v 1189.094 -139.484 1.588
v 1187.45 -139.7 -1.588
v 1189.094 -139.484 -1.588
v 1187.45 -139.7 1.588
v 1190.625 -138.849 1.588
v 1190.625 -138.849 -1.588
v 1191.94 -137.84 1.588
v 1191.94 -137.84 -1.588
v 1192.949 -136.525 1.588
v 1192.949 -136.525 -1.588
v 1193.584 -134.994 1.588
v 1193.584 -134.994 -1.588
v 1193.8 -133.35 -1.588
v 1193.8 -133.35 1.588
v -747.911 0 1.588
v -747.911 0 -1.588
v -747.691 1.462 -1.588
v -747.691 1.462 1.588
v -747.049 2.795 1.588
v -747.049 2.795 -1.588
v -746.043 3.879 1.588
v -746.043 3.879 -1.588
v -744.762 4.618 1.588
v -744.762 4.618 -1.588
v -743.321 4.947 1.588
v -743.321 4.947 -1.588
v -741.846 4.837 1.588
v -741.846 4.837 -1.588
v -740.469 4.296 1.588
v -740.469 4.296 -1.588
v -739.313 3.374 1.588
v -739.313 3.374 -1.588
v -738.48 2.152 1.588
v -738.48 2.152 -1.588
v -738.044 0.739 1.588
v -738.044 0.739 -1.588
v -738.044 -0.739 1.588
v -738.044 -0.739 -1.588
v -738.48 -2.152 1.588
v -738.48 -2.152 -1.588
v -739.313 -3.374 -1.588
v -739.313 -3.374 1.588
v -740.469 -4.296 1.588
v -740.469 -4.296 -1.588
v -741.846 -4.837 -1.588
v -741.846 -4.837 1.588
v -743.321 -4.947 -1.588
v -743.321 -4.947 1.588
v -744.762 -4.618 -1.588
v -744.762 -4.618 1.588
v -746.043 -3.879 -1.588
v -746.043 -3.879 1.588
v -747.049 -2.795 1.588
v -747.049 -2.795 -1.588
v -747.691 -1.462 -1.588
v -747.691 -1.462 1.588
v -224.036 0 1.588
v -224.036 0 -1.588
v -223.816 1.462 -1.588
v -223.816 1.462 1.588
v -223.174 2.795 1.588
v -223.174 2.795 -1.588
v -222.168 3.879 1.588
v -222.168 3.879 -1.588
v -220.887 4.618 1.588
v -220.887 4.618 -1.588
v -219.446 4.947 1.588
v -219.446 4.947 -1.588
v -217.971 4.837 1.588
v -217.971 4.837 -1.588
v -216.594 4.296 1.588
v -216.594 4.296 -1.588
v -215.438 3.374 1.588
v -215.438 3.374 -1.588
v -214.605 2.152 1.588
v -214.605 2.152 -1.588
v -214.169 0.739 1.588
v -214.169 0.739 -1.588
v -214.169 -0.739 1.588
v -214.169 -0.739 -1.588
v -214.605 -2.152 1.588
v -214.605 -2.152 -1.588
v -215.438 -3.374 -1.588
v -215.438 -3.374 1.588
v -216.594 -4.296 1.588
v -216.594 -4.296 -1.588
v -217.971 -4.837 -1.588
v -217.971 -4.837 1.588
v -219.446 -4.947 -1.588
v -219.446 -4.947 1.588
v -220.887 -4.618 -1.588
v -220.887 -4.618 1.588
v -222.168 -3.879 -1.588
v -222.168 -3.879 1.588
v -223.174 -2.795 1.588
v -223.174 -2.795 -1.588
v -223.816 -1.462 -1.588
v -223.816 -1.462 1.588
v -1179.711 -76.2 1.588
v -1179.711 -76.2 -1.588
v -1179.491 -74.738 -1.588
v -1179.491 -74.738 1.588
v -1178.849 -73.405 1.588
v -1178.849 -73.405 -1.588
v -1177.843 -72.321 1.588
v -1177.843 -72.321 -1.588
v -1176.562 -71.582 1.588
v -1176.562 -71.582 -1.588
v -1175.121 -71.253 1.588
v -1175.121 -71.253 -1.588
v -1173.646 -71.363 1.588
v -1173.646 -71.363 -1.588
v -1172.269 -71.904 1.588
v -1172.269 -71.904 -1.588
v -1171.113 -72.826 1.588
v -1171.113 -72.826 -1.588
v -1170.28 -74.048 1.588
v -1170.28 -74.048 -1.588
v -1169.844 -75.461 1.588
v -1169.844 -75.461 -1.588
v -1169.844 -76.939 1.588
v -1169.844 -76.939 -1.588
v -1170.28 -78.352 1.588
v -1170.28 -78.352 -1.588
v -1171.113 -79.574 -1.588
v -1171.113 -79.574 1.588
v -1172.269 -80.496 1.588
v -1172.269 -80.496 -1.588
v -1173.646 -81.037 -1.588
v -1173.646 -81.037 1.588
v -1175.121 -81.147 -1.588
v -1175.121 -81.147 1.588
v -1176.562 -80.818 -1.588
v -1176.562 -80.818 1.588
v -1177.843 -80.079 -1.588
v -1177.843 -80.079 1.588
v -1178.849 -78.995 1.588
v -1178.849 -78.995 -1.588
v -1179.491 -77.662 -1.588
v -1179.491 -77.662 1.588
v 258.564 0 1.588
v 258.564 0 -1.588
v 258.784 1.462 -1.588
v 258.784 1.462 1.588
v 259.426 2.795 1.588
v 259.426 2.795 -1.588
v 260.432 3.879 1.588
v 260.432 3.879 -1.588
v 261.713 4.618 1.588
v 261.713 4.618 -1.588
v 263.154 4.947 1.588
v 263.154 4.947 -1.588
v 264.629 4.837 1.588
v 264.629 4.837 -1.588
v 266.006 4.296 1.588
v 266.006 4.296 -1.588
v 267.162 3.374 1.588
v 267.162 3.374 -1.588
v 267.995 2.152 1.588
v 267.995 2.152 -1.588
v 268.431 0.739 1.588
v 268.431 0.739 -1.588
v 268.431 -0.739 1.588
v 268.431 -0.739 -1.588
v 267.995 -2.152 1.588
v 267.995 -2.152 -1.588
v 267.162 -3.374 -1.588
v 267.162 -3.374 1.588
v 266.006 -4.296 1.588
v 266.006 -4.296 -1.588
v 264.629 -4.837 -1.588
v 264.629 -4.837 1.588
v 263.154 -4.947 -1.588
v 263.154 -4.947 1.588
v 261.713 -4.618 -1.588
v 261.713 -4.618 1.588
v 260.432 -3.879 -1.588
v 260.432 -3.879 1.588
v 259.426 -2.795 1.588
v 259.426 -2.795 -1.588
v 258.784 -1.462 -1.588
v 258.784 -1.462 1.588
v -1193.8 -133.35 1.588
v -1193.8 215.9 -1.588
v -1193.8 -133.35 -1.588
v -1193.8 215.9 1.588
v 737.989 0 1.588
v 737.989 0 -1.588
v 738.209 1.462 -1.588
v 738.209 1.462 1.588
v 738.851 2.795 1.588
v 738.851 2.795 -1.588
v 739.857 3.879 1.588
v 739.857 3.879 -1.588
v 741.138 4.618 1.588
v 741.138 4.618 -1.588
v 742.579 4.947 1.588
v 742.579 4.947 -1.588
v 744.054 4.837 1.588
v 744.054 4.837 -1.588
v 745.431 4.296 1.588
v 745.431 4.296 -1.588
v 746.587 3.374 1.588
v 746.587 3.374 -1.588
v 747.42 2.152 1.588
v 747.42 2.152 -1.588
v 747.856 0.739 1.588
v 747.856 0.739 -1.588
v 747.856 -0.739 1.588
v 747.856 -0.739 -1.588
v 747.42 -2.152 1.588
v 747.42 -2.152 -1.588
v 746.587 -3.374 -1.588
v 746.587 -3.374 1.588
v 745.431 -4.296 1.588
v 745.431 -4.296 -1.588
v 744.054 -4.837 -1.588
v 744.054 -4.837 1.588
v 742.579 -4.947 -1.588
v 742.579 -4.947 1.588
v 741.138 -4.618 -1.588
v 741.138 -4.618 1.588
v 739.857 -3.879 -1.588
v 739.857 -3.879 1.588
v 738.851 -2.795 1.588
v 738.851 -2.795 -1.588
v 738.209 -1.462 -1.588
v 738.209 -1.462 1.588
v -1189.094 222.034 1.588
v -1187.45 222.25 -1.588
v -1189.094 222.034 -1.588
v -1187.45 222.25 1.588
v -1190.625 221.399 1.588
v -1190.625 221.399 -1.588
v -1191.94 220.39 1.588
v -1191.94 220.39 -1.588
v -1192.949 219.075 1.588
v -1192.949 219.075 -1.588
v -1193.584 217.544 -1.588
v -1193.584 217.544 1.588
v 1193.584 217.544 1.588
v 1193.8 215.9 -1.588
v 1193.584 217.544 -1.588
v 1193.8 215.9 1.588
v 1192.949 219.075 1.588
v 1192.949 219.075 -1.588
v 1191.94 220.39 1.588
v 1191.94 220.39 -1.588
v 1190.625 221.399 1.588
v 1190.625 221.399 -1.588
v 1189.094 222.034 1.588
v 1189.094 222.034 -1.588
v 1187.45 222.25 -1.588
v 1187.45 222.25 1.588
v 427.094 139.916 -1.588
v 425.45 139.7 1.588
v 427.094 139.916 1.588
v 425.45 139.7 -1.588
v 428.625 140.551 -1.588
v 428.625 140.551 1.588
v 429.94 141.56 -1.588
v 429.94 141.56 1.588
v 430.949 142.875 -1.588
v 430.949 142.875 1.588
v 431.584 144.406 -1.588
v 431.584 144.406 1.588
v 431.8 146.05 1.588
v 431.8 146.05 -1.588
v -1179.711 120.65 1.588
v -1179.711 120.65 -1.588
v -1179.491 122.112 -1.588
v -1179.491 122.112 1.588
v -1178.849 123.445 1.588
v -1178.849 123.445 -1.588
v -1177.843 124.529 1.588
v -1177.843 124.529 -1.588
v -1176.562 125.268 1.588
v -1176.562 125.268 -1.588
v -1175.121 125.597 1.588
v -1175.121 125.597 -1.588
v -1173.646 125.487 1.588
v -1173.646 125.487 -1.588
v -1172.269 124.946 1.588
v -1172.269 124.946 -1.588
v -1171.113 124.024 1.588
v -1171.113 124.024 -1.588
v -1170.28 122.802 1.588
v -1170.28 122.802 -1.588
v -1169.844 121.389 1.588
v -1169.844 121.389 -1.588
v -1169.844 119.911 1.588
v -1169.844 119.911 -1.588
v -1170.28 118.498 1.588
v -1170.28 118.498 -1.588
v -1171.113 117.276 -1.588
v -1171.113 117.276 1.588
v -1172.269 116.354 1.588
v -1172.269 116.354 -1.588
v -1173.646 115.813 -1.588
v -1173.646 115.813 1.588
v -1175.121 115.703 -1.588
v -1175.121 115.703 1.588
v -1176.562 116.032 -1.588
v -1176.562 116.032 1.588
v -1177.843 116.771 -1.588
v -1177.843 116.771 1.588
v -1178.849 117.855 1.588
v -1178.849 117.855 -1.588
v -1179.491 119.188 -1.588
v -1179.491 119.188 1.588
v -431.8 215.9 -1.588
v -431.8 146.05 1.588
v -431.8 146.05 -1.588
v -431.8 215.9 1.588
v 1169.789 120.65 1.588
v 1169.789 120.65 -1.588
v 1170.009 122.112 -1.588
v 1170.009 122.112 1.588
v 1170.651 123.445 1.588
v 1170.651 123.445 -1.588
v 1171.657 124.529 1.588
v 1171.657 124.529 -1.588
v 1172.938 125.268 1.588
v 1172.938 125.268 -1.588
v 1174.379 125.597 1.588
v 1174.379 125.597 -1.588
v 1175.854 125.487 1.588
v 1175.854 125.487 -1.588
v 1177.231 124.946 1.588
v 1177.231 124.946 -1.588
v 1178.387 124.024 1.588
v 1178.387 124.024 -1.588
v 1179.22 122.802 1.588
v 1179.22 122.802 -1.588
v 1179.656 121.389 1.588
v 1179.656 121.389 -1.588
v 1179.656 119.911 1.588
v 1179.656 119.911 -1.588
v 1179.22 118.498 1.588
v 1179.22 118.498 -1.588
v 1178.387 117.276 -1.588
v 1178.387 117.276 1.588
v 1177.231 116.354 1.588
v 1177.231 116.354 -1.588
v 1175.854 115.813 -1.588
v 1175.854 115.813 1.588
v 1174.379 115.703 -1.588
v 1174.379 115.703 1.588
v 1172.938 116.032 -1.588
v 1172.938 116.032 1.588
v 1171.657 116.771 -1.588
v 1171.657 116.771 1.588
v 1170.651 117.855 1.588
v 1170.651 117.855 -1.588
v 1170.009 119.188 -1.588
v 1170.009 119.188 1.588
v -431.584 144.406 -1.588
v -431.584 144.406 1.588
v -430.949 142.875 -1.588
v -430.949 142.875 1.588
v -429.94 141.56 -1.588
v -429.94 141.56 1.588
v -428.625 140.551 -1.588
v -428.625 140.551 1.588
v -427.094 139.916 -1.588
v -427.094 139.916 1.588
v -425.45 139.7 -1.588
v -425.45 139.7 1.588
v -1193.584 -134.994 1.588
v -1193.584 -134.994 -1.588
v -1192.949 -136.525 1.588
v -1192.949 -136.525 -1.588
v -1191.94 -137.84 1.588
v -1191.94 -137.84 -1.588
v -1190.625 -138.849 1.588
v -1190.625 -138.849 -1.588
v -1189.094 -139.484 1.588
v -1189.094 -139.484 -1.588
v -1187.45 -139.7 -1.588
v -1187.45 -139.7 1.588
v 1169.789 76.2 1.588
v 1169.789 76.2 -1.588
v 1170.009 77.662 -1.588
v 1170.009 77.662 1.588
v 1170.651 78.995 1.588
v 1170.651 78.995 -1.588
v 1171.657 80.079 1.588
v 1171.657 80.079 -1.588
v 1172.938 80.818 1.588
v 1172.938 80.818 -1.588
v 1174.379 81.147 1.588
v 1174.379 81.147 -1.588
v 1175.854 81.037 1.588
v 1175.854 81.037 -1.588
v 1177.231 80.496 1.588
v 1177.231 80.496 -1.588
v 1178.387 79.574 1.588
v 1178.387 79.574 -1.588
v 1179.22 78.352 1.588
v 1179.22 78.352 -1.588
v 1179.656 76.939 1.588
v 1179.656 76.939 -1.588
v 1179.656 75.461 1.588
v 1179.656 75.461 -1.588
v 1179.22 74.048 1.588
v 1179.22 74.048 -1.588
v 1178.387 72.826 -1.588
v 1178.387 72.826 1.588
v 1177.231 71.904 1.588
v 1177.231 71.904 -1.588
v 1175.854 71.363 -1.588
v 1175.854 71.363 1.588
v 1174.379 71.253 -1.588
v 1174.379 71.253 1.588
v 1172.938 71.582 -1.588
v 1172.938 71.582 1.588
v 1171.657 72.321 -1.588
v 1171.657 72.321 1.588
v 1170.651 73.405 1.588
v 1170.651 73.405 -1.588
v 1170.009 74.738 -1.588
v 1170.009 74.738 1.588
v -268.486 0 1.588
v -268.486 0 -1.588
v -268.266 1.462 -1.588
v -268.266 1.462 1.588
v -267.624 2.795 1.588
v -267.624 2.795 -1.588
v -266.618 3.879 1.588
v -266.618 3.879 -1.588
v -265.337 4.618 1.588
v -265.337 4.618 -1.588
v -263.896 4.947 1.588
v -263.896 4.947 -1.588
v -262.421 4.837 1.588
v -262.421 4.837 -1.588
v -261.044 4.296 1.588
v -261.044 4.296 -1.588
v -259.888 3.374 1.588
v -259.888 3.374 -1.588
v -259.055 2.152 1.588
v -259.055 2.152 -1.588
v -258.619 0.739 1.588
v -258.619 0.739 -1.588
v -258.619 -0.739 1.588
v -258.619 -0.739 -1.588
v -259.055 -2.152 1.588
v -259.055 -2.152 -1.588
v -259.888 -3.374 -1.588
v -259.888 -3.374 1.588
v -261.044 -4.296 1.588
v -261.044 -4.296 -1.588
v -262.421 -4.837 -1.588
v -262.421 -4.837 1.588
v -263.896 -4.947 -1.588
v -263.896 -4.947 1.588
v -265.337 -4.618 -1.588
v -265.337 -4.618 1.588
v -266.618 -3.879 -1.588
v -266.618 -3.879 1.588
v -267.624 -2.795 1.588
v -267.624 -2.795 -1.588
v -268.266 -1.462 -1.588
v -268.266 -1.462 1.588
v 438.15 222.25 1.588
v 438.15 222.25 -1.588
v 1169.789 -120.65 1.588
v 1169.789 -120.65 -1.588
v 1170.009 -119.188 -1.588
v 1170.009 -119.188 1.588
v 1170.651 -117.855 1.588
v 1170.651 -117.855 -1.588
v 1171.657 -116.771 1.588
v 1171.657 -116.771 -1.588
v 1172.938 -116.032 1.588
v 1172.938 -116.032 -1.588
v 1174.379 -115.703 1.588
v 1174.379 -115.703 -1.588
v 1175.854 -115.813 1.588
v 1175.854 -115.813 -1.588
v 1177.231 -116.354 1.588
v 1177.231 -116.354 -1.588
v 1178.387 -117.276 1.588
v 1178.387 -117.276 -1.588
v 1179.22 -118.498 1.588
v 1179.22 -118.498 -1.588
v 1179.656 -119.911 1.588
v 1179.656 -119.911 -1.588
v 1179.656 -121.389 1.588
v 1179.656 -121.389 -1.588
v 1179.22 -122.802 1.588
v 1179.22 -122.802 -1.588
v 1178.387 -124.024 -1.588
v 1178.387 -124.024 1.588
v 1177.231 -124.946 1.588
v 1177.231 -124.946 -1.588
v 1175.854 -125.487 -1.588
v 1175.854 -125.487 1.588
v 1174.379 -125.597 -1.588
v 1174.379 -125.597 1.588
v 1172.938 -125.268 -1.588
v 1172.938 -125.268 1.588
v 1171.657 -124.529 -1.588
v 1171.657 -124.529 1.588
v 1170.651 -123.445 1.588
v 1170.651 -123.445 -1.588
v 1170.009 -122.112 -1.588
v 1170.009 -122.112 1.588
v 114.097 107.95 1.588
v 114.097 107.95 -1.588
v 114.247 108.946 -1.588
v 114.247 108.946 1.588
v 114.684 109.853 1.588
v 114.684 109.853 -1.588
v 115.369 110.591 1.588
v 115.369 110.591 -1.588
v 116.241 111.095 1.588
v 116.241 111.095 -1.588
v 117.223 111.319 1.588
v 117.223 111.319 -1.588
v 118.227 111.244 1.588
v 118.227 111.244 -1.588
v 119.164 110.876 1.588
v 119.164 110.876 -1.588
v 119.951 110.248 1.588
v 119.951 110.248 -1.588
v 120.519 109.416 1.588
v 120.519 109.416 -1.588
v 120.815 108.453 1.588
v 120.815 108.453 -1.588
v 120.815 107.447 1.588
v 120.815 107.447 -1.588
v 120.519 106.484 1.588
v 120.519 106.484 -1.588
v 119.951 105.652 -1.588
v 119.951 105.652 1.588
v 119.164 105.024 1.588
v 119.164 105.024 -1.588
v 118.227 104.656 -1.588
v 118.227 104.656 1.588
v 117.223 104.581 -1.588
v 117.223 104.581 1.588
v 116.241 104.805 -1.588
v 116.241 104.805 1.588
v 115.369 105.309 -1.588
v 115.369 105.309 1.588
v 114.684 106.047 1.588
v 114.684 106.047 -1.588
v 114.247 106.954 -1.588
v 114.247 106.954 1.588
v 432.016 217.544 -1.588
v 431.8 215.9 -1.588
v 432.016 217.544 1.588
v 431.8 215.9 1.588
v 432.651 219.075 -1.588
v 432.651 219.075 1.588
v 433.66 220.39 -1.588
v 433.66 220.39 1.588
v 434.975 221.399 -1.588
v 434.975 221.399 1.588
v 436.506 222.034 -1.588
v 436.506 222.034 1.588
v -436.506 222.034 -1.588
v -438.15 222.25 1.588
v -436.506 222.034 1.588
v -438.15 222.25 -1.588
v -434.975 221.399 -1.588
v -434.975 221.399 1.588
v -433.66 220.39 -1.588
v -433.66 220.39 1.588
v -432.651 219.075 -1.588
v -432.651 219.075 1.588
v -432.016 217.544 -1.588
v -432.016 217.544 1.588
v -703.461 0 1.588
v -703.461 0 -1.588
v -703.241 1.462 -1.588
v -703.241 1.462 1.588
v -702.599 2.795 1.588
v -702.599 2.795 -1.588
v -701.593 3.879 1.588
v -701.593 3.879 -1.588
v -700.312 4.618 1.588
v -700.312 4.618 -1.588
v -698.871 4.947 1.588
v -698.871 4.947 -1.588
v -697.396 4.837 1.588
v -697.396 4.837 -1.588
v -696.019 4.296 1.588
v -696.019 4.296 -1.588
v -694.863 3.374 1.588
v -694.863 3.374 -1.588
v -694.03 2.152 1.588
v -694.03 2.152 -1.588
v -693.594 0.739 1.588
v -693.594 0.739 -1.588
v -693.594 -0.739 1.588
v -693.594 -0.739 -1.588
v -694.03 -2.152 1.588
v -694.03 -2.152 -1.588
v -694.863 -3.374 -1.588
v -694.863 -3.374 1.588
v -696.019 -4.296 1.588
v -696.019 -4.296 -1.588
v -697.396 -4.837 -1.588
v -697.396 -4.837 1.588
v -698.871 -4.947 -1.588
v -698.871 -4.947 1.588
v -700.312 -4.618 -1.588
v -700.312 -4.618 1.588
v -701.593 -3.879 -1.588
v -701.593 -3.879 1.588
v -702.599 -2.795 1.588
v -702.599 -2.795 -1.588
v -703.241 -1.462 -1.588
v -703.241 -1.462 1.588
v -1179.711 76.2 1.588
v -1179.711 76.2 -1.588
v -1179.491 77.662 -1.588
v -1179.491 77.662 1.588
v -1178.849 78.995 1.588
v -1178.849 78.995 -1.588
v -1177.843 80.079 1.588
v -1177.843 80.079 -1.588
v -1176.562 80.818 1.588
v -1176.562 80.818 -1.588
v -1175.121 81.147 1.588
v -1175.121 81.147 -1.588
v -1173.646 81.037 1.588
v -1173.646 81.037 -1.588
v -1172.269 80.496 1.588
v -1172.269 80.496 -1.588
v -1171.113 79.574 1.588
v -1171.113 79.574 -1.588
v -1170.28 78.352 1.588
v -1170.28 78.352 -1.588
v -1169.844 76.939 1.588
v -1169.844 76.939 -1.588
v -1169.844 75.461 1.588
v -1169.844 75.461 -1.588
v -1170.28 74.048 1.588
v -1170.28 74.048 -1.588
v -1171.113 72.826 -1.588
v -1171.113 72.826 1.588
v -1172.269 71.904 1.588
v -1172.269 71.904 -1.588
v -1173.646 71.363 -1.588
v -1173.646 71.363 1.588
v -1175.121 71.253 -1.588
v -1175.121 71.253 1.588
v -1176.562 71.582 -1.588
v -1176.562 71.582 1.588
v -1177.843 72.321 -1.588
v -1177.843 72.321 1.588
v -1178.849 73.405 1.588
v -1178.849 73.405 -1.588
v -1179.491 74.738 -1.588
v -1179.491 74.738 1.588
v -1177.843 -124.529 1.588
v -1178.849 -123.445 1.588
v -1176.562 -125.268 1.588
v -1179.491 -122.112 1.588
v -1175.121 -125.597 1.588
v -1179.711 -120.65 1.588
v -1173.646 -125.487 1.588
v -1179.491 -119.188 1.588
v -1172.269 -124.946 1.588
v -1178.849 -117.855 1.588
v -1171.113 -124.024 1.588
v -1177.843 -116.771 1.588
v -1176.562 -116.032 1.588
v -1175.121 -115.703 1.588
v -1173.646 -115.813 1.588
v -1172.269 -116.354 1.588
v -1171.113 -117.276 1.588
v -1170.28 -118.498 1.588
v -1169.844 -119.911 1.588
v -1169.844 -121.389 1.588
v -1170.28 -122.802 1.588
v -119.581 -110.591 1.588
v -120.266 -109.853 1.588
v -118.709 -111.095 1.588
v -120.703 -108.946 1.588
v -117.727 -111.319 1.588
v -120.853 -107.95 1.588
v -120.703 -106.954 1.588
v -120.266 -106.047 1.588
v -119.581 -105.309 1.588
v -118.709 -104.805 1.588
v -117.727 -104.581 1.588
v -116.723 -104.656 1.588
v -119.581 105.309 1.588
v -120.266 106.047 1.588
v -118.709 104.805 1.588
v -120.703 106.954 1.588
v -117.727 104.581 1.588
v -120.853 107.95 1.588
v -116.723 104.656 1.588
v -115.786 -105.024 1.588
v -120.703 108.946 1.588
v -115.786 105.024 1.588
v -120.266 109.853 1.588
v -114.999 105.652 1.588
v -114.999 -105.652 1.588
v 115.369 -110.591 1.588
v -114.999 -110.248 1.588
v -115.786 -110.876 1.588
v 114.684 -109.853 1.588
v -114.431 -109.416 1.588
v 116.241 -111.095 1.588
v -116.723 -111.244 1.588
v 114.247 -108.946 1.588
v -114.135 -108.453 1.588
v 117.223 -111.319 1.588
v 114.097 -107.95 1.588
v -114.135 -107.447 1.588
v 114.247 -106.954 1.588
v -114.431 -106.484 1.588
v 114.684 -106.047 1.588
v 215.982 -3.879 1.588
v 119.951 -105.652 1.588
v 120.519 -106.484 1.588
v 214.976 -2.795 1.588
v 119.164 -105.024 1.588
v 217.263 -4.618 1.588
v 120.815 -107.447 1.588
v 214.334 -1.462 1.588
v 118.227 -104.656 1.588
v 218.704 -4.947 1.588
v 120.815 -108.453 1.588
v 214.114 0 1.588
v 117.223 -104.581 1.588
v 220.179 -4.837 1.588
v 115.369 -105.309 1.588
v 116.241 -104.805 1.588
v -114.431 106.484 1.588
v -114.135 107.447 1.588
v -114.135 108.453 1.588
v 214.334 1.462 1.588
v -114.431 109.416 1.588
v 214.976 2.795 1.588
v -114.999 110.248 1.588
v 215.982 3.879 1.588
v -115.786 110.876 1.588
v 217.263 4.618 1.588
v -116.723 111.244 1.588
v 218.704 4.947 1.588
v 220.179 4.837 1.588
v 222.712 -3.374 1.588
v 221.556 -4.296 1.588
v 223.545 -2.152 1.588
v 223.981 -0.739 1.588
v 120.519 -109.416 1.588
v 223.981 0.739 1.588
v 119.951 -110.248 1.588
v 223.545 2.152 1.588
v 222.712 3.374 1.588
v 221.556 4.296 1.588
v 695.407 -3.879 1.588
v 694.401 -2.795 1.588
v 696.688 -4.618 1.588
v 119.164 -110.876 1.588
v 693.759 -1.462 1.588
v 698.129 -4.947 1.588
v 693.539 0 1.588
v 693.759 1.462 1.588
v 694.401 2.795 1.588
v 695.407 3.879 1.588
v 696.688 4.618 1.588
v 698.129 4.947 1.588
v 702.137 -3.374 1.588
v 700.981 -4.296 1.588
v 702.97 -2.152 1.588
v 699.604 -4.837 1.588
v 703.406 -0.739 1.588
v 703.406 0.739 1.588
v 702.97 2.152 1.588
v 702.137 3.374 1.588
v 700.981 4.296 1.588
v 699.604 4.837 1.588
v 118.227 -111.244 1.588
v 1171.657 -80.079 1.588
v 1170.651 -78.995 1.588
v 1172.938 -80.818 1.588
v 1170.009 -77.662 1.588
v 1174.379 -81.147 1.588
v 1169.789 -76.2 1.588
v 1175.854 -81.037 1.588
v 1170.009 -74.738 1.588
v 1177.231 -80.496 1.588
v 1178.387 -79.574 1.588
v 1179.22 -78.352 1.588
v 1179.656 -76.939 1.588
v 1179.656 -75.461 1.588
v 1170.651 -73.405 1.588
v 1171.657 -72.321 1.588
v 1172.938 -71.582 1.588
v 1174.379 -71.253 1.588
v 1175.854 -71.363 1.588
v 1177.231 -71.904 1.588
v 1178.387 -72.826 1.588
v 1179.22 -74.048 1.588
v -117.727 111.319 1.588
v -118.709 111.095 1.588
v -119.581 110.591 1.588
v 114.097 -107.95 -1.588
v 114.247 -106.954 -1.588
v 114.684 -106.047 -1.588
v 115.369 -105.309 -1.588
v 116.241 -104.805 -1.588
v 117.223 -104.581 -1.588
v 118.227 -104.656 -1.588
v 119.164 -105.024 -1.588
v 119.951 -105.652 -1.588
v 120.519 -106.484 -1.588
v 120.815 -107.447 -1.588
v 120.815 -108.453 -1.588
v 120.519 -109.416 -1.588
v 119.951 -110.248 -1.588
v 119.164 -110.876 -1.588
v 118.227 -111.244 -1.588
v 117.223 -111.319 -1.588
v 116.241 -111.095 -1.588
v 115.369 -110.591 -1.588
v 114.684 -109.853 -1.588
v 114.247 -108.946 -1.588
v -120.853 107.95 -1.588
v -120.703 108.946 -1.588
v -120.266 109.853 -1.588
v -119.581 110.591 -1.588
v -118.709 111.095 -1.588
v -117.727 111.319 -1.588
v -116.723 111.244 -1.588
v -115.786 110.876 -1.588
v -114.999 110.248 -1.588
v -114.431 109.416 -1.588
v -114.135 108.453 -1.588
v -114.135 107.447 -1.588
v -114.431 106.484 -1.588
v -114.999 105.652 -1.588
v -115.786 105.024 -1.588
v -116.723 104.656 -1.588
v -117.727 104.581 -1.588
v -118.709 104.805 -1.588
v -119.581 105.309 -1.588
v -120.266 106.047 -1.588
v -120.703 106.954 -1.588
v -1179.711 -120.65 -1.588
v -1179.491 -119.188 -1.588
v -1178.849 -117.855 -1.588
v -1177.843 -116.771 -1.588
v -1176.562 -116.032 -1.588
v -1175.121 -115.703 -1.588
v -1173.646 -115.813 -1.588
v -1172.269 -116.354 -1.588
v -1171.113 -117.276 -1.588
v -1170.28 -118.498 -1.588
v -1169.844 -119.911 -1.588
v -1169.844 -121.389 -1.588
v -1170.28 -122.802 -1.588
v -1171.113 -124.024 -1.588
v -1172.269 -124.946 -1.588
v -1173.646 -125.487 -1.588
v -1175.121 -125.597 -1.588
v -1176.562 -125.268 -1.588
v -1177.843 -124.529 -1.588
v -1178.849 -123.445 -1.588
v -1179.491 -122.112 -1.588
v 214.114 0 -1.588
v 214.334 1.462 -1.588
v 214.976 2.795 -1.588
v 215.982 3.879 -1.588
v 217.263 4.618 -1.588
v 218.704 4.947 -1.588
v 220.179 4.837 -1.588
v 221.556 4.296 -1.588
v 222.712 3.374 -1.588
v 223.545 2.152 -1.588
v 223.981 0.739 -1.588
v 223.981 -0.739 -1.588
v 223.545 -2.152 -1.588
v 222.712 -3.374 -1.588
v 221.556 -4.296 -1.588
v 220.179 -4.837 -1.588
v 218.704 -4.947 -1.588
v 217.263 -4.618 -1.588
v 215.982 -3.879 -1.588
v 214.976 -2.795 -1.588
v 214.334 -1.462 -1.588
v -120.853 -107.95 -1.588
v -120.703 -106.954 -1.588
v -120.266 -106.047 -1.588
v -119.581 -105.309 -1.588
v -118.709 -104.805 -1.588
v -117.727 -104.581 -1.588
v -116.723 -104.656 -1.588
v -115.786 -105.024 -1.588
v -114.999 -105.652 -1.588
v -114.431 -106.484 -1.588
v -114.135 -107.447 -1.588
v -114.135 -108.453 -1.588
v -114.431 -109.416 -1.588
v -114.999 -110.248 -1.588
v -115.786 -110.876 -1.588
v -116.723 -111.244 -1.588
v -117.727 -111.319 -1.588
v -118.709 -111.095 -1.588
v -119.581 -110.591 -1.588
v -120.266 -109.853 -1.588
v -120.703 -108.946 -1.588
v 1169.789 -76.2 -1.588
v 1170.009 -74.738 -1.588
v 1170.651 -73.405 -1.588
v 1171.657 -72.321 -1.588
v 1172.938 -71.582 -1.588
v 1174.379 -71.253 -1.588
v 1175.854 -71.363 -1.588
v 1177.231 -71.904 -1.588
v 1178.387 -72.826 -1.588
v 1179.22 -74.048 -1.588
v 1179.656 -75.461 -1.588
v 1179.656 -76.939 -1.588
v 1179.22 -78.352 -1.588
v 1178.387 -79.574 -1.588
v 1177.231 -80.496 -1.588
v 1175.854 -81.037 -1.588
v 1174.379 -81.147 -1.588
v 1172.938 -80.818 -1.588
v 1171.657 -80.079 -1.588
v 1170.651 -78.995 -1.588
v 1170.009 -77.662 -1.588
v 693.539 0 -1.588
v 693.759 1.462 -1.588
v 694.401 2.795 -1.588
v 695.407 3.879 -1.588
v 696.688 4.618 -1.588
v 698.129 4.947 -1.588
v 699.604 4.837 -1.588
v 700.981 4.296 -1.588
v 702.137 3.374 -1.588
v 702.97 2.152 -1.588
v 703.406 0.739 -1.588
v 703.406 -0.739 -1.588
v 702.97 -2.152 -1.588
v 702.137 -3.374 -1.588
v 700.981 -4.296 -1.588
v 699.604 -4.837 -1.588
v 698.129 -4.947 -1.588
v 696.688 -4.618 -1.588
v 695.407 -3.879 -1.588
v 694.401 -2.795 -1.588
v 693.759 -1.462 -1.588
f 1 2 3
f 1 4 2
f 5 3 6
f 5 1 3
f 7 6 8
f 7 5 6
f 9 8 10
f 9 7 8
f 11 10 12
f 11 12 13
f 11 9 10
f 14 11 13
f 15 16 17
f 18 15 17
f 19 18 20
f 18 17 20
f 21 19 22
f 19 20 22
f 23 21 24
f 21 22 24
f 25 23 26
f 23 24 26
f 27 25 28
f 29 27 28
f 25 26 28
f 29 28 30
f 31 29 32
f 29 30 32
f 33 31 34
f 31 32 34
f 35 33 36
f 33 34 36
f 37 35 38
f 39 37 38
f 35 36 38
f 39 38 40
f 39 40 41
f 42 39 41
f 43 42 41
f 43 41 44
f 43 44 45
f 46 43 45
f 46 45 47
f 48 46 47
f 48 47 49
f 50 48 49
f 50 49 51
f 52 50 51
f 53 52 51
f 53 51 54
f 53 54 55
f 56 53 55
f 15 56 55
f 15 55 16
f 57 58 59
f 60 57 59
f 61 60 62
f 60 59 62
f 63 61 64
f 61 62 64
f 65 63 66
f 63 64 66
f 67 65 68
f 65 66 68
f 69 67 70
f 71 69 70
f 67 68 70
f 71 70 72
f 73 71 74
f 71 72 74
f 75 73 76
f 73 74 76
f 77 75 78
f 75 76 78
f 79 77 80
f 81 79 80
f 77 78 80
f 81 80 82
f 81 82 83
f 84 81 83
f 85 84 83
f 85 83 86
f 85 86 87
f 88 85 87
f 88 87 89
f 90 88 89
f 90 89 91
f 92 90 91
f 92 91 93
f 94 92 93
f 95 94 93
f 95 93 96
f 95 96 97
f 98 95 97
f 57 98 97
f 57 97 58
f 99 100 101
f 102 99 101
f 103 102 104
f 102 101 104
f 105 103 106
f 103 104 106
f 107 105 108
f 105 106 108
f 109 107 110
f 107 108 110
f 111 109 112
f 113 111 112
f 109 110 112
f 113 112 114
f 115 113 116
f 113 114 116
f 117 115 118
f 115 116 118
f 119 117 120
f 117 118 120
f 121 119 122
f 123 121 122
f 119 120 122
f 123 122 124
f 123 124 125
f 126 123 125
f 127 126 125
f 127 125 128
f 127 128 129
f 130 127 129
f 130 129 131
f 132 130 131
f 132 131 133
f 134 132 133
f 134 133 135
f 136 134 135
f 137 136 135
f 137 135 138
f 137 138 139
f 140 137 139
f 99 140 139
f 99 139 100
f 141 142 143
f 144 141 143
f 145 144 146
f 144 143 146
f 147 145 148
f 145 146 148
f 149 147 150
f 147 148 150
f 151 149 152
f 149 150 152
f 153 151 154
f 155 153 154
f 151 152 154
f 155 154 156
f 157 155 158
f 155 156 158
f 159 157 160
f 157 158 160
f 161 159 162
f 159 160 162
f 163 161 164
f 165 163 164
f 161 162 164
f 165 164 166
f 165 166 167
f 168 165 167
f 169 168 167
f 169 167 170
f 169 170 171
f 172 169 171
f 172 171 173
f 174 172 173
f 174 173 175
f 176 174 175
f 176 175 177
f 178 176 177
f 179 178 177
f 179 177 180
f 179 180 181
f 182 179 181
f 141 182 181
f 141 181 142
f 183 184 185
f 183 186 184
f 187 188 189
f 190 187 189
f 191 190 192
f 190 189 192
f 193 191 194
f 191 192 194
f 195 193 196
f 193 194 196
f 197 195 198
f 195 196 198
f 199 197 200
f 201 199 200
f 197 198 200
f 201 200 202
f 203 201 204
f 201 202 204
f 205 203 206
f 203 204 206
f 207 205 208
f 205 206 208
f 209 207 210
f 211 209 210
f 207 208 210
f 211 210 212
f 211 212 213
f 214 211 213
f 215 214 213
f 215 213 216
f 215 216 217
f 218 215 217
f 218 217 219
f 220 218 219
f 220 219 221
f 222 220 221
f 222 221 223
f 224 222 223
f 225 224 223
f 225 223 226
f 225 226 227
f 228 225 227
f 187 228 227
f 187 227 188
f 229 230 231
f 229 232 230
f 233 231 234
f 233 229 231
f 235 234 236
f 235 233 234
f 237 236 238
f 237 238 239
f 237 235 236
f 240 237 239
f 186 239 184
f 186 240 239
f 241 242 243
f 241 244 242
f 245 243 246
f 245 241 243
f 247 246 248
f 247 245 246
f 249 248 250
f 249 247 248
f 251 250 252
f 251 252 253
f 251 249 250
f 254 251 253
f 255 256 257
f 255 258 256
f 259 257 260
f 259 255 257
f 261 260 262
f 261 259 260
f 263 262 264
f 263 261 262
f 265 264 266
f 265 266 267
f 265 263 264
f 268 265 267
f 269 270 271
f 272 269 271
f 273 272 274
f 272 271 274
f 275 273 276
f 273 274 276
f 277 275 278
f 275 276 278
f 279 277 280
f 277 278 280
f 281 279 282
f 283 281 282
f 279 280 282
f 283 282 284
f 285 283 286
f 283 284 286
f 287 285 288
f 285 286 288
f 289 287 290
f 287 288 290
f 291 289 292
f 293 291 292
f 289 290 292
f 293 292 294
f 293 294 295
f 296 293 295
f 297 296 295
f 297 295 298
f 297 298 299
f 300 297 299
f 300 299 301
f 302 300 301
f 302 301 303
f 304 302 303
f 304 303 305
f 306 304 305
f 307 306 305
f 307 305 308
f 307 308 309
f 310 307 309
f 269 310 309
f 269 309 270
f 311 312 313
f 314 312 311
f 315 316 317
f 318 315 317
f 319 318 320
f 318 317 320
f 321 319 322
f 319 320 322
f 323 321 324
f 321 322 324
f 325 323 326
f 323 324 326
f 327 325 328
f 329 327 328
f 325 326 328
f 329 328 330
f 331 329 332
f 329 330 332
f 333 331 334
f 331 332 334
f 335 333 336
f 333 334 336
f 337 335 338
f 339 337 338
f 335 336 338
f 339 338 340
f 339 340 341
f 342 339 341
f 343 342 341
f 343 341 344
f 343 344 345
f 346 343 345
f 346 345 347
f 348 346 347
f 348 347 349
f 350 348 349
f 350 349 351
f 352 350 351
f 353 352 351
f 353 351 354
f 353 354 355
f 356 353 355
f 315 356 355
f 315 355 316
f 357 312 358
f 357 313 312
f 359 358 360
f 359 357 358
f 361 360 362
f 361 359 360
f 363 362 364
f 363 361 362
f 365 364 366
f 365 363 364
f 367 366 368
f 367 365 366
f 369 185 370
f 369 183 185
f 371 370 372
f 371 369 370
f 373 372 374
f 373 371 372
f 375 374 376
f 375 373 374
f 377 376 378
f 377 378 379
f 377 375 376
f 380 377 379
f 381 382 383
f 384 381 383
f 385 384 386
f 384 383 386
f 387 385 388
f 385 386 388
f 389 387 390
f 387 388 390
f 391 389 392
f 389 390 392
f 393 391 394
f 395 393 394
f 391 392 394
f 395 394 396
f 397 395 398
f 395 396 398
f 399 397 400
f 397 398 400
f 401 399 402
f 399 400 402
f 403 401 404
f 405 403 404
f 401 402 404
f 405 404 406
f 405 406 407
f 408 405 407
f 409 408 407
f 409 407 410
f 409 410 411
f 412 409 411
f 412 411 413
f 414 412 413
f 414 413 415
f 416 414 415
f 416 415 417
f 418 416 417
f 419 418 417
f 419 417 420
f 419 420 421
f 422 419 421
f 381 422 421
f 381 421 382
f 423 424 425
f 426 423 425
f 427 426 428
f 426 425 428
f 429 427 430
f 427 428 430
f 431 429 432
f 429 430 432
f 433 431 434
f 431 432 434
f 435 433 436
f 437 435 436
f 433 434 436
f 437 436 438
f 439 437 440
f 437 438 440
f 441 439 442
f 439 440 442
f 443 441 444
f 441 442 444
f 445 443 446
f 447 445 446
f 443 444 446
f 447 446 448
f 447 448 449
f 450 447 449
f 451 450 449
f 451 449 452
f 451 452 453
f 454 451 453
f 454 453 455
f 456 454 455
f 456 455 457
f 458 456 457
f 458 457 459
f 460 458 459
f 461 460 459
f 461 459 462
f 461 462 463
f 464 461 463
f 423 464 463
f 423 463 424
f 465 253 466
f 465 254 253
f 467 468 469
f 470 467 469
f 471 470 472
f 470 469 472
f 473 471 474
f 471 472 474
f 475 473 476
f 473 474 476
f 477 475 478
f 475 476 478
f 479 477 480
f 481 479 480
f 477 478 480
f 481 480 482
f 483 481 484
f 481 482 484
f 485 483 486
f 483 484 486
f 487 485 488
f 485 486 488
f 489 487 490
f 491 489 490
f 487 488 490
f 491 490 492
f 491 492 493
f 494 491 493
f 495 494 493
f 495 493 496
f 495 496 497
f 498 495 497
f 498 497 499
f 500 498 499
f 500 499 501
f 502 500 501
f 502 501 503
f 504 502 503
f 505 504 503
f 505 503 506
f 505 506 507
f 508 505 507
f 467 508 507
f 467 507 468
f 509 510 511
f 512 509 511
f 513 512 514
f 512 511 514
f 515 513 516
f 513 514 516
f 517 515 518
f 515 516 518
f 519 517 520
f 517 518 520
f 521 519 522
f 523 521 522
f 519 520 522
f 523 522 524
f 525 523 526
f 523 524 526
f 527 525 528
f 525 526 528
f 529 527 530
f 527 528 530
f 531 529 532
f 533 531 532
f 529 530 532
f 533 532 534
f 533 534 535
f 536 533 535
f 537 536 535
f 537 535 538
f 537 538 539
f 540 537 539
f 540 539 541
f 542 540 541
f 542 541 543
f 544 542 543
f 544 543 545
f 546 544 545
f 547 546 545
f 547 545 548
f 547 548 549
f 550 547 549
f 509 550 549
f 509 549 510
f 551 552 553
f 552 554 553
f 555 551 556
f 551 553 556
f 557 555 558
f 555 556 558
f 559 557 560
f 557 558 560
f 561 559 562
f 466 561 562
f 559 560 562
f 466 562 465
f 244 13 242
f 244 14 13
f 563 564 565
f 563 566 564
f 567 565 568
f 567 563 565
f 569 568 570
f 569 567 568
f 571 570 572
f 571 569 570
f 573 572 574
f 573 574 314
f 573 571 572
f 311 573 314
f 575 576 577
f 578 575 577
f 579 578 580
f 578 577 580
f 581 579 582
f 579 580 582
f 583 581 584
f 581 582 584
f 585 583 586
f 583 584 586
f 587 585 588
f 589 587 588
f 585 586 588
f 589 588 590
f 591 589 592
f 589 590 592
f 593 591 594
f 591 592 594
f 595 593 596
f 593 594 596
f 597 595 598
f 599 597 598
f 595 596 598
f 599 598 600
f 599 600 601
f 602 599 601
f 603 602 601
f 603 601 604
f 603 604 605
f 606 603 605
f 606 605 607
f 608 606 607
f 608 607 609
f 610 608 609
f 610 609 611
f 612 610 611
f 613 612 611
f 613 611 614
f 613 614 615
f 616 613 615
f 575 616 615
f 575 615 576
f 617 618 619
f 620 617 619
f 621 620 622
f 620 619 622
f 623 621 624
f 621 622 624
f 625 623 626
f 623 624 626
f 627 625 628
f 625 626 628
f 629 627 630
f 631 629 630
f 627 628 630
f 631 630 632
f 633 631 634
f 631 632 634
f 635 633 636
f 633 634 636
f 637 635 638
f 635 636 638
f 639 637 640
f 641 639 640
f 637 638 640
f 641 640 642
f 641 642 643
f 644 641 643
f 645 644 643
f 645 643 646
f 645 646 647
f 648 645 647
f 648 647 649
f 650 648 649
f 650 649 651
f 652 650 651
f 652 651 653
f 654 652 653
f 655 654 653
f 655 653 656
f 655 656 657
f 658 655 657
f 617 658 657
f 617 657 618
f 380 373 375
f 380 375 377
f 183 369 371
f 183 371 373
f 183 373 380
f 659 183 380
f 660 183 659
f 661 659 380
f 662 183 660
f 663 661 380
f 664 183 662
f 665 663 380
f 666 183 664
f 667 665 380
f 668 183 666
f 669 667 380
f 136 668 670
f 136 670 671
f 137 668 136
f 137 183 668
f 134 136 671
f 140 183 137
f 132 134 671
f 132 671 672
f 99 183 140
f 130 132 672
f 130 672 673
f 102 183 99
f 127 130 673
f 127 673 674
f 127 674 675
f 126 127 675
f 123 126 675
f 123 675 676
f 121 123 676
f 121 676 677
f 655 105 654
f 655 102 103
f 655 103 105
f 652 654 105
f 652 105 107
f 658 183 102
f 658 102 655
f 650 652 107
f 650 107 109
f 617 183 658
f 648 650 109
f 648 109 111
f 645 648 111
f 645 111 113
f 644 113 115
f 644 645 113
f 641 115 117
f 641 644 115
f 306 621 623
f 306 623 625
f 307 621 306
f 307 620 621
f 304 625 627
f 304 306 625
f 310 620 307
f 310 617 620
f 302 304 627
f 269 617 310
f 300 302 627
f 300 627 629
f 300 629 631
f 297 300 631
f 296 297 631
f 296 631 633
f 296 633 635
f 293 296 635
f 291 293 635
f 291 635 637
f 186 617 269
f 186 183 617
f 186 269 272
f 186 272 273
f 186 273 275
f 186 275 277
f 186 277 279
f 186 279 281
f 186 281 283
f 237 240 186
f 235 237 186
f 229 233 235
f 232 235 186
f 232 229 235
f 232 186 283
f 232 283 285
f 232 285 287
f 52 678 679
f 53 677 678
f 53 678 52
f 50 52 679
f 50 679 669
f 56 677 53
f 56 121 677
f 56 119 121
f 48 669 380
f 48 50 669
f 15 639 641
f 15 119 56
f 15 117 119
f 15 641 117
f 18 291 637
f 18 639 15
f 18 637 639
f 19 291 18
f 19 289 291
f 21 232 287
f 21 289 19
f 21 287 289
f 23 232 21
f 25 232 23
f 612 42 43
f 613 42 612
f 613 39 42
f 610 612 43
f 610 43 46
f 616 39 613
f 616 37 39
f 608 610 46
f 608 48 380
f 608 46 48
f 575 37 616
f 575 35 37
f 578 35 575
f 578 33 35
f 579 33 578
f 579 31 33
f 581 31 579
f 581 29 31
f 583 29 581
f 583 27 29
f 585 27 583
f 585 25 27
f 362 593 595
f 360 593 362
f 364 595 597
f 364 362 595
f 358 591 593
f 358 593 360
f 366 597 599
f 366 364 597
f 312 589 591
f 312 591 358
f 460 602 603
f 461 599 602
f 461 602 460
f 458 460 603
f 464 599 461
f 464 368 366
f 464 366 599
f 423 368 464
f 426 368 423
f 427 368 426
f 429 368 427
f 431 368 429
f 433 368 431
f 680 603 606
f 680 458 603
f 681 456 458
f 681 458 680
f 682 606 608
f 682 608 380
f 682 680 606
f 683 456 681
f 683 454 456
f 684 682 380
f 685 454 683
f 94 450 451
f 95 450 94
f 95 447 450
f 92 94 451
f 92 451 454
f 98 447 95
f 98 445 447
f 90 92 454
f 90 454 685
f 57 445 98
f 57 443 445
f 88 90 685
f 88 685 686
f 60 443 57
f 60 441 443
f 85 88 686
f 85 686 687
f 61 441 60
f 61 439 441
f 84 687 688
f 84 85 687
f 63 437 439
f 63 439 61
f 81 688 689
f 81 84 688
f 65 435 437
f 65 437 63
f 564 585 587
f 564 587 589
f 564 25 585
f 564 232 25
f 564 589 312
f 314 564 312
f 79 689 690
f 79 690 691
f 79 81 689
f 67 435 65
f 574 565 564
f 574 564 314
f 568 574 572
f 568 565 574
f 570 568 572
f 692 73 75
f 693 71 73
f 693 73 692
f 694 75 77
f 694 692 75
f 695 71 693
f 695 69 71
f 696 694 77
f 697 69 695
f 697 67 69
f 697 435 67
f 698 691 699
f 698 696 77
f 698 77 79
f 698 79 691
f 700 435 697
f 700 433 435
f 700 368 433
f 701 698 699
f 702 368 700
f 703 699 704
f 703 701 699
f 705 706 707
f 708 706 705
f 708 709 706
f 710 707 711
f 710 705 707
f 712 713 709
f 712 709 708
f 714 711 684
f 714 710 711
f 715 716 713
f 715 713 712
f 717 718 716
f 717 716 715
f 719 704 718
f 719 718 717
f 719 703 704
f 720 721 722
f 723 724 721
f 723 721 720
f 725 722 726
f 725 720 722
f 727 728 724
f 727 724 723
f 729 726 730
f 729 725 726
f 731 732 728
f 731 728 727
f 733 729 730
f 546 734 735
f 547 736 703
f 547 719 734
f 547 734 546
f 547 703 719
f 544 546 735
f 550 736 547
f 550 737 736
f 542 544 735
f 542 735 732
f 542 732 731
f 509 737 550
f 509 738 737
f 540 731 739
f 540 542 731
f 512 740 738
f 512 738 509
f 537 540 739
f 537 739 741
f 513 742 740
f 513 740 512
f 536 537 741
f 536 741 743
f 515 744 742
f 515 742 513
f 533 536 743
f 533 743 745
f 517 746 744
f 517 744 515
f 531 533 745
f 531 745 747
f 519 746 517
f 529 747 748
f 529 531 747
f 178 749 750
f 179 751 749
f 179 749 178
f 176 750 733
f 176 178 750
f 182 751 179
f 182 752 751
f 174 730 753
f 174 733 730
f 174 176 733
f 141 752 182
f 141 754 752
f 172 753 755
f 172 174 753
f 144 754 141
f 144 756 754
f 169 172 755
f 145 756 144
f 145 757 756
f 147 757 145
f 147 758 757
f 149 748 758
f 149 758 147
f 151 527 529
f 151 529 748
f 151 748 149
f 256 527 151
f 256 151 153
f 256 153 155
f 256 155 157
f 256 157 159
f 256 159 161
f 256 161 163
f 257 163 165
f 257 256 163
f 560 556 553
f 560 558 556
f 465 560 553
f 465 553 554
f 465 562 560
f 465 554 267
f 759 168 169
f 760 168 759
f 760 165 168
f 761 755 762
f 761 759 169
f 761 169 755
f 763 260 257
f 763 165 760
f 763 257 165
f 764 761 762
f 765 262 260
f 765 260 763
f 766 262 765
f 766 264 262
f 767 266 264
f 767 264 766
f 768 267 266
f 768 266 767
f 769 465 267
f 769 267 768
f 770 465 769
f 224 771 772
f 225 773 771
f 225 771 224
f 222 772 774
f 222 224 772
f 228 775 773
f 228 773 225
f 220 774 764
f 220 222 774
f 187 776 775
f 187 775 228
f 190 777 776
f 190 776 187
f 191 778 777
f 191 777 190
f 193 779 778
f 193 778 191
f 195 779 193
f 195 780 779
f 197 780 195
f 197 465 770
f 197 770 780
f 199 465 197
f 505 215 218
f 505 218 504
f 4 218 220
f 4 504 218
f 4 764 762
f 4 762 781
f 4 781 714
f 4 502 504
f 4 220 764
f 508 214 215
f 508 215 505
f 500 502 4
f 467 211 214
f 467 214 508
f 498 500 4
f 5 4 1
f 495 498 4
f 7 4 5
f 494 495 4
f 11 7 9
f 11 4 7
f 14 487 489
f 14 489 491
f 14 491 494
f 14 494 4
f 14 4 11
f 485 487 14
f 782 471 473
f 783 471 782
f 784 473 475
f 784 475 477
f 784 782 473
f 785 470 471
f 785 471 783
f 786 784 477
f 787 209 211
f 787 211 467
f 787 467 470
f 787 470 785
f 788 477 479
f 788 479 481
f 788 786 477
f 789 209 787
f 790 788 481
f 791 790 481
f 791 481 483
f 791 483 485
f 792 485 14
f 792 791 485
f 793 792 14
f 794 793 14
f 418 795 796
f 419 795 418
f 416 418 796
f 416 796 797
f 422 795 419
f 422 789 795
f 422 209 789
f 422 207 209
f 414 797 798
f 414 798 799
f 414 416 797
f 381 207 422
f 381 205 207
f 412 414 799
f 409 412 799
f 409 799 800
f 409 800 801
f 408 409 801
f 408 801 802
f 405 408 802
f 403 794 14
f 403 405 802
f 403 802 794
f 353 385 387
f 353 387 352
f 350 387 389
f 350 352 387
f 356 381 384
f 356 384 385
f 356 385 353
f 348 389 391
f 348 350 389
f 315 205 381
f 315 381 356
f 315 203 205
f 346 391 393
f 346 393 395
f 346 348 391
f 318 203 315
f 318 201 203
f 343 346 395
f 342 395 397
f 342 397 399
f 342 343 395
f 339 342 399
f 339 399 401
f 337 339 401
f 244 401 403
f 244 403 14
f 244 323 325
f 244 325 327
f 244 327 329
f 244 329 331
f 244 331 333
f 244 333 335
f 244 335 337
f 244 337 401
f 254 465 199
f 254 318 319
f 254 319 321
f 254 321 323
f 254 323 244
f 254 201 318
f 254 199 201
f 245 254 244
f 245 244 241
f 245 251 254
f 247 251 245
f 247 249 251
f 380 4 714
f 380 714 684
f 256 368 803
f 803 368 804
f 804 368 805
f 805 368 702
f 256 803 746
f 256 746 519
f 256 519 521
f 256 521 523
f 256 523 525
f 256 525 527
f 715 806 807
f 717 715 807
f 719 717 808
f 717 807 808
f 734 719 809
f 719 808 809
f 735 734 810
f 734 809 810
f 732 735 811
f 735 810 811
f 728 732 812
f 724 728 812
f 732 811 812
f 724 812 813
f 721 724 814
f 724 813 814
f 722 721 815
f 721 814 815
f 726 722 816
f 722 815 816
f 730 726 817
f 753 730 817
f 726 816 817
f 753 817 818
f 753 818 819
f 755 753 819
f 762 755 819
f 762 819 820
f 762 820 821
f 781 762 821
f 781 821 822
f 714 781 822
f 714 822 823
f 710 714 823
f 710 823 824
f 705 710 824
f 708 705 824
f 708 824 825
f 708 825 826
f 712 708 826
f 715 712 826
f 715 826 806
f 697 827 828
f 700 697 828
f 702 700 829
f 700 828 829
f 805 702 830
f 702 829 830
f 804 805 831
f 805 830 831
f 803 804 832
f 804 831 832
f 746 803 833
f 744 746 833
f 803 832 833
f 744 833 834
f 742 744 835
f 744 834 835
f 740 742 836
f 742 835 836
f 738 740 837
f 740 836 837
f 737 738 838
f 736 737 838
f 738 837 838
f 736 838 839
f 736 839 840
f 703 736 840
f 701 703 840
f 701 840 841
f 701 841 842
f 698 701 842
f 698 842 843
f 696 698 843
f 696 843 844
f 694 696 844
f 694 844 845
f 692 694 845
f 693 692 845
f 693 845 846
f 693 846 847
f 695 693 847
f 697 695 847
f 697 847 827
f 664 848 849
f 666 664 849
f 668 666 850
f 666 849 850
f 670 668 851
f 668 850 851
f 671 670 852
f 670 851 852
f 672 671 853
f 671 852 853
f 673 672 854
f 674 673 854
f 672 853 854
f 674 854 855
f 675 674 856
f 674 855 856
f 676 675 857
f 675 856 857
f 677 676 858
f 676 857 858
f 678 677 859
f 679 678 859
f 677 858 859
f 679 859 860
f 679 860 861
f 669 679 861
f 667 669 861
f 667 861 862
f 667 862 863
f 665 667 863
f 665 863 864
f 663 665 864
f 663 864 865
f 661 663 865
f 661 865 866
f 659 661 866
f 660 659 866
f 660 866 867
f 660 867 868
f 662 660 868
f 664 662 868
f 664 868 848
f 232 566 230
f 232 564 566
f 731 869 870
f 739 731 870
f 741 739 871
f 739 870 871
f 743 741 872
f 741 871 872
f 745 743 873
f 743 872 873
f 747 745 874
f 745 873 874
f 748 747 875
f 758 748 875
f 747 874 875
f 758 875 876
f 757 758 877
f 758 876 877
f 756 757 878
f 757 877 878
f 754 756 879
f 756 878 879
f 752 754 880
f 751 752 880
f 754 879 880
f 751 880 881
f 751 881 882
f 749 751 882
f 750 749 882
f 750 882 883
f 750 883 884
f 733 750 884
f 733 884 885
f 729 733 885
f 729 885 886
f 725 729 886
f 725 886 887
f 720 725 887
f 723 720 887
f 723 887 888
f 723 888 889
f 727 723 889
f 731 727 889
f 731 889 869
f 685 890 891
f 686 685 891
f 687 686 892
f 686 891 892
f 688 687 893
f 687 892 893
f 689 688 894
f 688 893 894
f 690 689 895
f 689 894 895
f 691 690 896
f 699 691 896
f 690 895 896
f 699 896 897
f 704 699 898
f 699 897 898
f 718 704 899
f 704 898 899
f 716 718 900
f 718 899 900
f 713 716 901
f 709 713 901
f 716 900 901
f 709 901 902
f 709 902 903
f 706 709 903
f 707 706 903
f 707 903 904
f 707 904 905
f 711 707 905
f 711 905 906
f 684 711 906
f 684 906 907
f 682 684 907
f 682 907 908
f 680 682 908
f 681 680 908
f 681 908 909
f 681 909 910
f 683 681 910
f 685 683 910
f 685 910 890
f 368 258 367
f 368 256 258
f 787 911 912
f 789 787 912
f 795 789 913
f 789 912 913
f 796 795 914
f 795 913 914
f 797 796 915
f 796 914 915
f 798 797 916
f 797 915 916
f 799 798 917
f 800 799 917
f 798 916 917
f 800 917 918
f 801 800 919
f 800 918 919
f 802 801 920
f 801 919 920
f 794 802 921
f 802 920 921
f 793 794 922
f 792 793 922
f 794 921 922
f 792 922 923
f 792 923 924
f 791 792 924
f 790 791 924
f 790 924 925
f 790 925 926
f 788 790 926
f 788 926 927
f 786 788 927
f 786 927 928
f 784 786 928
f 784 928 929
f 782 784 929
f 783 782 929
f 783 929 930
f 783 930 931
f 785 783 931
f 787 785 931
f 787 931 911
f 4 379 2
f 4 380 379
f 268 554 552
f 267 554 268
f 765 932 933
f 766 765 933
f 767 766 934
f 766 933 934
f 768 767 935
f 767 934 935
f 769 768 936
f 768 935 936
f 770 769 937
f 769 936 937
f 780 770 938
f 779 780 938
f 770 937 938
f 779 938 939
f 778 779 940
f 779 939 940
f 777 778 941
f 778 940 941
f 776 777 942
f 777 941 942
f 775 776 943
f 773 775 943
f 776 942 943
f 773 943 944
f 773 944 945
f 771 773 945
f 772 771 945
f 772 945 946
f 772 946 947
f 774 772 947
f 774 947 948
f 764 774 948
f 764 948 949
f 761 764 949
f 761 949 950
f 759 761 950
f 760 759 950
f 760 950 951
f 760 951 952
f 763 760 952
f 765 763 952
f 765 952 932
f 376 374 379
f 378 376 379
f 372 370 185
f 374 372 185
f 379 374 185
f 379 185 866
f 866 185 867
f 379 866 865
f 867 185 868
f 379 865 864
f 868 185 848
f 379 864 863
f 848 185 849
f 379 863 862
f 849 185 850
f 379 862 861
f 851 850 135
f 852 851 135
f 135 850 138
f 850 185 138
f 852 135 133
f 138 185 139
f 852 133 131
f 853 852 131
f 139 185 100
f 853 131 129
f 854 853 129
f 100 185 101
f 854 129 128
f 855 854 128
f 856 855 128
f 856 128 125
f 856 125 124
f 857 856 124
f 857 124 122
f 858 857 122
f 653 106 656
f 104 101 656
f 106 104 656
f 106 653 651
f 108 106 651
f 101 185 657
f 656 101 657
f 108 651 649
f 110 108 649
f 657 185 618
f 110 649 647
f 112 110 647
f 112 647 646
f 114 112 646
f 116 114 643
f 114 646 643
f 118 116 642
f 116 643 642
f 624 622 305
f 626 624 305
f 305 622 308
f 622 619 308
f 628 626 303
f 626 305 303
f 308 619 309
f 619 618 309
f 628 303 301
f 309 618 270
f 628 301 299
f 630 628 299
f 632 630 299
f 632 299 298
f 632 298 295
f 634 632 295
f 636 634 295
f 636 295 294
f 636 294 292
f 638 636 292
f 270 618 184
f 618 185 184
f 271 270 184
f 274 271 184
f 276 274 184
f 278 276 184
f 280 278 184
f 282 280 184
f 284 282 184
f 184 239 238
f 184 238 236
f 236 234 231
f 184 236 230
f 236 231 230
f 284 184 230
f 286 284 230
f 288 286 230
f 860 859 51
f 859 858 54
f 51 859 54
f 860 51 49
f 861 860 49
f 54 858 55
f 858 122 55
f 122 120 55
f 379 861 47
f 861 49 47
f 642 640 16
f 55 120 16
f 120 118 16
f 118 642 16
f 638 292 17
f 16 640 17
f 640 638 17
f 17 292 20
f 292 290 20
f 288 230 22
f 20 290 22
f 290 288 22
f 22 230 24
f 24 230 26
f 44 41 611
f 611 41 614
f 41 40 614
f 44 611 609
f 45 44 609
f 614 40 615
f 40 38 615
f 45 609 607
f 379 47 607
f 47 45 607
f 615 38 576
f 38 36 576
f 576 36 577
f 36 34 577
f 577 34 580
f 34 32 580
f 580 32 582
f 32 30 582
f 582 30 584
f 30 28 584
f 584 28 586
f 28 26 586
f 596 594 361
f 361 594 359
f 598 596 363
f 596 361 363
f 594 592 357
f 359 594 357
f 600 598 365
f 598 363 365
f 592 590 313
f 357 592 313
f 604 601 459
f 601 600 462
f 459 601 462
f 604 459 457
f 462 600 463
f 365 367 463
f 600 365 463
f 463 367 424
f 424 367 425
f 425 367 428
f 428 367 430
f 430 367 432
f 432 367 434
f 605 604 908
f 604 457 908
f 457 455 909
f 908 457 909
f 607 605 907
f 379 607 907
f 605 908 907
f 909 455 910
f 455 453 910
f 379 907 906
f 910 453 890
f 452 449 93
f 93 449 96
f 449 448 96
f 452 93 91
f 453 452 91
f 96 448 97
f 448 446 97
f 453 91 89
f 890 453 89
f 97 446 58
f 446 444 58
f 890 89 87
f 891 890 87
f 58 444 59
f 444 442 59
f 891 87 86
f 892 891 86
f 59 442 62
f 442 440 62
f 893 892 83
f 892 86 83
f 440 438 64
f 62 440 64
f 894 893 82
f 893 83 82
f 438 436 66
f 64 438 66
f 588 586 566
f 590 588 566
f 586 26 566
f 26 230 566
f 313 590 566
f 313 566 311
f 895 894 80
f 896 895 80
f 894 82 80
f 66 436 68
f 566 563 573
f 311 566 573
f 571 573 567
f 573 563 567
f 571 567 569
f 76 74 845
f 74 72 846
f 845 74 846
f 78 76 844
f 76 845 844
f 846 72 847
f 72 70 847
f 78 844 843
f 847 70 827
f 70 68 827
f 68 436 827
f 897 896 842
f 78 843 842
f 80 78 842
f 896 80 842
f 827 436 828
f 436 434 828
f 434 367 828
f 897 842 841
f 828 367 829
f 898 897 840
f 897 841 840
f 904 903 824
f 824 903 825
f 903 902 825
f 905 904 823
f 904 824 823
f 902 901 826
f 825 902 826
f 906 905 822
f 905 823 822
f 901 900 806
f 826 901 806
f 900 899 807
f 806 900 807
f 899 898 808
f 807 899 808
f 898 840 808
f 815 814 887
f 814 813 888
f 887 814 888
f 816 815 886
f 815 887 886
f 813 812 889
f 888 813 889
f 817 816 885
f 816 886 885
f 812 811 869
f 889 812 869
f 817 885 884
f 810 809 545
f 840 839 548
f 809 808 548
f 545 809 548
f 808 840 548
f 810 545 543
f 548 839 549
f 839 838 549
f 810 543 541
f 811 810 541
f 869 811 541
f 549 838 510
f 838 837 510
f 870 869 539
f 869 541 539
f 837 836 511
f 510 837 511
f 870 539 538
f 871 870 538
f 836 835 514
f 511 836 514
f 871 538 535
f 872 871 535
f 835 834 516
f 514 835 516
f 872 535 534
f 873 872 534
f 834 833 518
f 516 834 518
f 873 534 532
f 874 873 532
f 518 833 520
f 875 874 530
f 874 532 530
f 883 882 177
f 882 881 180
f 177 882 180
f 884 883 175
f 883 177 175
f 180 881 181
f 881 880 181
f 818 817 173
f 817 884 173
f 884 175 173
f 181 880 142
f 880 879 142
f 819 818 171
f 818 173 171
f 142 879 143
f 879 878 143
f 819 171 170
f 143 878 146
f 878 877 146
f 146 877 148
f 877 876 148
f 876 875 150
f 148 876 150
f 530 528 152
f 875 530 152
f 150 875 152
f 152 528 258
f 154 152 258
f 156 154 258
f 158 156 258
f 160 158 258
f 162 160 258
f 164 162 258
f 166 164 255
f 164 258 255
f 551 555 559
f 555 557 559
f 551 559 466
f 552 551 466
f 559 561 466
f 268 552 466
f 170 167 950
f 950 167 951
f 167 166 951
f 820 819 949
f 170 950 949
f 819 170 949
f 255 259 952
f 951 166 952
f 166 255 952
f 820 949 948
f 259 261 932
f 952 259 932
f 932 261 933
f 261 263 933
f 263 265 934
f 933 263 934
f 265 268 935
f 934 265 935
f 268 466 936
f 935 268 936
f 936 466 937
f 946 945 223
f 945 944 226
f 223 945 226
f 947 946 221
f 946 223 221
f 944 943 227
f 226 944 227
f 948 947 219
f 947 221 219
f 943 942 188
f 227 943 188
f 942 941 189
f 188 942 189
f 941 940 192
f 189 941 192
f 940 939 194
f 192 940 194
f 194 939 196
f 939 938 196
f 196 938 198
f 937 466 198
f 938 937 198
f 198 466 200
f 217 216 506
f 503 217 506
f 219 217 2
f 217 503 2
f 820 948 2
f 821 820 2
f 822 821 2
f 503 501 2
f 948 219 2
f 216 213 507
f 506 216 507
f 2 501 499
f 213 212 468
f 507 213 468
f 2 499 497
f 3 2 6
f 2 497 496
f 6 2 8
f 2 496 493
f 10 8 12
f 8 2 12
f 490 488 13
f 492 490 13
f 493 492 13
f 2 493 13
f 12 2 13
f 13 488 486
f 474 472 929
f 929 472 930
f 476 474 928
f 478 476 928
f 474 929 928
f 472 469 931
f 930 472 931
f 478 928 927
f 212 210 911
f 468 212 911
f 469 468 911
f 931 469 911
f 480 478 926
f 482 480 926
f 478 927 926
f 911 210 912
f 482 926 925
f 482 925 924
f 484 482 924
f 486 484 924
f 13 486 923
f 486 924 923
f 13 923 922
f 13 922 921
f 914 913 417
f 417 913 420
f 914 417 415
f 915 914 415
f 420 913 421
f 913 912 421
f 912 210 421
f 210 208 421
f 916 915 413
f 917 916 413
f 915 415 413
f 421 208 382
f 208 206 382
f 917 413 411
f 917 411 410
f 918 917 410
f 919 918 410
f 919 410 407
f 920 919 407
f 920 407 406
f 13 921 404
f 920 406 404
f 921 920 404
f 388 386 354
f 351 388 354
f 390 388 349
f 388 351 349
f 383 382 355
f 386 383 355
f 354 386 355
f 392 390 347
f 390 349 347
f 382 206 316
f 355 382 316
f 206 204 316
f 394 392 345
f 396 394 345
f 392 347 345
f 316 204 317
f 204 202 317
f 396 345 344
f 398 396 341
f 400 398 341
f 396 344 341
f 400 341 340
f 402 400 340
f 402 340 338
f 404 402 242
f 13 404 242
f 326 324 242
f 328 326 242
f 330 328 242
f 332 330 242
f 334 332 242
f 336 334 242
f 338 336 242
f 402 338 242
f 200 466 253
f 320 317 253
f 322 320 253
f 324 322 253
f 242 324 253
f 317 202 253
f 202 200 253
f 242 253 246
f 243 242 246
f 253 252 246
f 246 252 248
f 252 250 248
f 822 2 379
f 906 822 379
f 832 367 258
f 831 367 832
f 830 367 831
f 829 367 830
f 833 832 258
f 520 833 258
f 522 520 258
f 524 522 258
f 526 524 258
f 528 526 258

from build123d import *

# Parameters (mm, degrees)
BOSS_EXTRUDE1_DEPTH              = 1.5875
F_25_64_0_39063_DIAMETER_HOLE1_D = 9.922002
FILLET1_R                        = 6.35
F_1_4_CLEARANCE_HOLE2_D          = 6.7564


with BuildPart() as part:
    # Sketch1 → Boss-Extrude1 (new, symmetric)
    with BuildSketch(Plane.XY):
        Polygon((-431.8, 222.25), (-1193.8, 222.25), (-1193.8, 139.7), (-1193.8, -139.7), (1193.8, -139.7), (1193.8, 139.7), (1193.8, 222.25), (431.8, 222.25), (431.8, 139.7), (-431.8, 139.7), align=None)
    extrude(amount=BOSS_EXTRUDE1_DEPTH, both=True)

    # 25/64 (0.39063) Diameter Hole1 (through all)
    with Locations(Plane.XY.offset(1.5875)):
        with Locations((-1174.75, 120.65), (-1174.75, -120.65), (1174.75, 120.65), (1174.75, -120.65), (-742.95, 0), (-698.5, 0), (-263.525, 0), (-219.075, 0), (742.95, 0), (698.5, 0), (263.525, 0), (219.075, 0), (1174.75, -76.2), (1174.75, 76.2), (-1174.75, 76.2), (-1174.75, -76.2)):
            Hole(F_25_64_0_39063_DIAMETER_HOLE1_D / 2)

    # Fillet1
    fillet1_edges = [part.edges().sort_by_distance(p)[0] for p in [
        (1193.8, -139.7, 0),
        (-1193.8, -139.7, 0),
        (-1193.8, 222.25, 0),
        (-431.8, 222.25, 0),
        (-431.8, 139.7, 0),
        (431.8, 139.7, 0),
        (431.8, 222.25, 0),
        (1193.8, 222.25, 0),
    ]]
    fillet(fillet1_edges, radius=FILLET1_R)

    # 1/4 Clearance Hole2 (through all)
    with Locations(Plane.XY.offset(1.5875)):
        with Locations((-117.475, 107.95), (-117.475, -107.95), (117.475, 107.95), (117.475, -107.95)):
            Hole(F_1_4_CLEARANCE_HOLE2_D / 2)


solid = part.part
